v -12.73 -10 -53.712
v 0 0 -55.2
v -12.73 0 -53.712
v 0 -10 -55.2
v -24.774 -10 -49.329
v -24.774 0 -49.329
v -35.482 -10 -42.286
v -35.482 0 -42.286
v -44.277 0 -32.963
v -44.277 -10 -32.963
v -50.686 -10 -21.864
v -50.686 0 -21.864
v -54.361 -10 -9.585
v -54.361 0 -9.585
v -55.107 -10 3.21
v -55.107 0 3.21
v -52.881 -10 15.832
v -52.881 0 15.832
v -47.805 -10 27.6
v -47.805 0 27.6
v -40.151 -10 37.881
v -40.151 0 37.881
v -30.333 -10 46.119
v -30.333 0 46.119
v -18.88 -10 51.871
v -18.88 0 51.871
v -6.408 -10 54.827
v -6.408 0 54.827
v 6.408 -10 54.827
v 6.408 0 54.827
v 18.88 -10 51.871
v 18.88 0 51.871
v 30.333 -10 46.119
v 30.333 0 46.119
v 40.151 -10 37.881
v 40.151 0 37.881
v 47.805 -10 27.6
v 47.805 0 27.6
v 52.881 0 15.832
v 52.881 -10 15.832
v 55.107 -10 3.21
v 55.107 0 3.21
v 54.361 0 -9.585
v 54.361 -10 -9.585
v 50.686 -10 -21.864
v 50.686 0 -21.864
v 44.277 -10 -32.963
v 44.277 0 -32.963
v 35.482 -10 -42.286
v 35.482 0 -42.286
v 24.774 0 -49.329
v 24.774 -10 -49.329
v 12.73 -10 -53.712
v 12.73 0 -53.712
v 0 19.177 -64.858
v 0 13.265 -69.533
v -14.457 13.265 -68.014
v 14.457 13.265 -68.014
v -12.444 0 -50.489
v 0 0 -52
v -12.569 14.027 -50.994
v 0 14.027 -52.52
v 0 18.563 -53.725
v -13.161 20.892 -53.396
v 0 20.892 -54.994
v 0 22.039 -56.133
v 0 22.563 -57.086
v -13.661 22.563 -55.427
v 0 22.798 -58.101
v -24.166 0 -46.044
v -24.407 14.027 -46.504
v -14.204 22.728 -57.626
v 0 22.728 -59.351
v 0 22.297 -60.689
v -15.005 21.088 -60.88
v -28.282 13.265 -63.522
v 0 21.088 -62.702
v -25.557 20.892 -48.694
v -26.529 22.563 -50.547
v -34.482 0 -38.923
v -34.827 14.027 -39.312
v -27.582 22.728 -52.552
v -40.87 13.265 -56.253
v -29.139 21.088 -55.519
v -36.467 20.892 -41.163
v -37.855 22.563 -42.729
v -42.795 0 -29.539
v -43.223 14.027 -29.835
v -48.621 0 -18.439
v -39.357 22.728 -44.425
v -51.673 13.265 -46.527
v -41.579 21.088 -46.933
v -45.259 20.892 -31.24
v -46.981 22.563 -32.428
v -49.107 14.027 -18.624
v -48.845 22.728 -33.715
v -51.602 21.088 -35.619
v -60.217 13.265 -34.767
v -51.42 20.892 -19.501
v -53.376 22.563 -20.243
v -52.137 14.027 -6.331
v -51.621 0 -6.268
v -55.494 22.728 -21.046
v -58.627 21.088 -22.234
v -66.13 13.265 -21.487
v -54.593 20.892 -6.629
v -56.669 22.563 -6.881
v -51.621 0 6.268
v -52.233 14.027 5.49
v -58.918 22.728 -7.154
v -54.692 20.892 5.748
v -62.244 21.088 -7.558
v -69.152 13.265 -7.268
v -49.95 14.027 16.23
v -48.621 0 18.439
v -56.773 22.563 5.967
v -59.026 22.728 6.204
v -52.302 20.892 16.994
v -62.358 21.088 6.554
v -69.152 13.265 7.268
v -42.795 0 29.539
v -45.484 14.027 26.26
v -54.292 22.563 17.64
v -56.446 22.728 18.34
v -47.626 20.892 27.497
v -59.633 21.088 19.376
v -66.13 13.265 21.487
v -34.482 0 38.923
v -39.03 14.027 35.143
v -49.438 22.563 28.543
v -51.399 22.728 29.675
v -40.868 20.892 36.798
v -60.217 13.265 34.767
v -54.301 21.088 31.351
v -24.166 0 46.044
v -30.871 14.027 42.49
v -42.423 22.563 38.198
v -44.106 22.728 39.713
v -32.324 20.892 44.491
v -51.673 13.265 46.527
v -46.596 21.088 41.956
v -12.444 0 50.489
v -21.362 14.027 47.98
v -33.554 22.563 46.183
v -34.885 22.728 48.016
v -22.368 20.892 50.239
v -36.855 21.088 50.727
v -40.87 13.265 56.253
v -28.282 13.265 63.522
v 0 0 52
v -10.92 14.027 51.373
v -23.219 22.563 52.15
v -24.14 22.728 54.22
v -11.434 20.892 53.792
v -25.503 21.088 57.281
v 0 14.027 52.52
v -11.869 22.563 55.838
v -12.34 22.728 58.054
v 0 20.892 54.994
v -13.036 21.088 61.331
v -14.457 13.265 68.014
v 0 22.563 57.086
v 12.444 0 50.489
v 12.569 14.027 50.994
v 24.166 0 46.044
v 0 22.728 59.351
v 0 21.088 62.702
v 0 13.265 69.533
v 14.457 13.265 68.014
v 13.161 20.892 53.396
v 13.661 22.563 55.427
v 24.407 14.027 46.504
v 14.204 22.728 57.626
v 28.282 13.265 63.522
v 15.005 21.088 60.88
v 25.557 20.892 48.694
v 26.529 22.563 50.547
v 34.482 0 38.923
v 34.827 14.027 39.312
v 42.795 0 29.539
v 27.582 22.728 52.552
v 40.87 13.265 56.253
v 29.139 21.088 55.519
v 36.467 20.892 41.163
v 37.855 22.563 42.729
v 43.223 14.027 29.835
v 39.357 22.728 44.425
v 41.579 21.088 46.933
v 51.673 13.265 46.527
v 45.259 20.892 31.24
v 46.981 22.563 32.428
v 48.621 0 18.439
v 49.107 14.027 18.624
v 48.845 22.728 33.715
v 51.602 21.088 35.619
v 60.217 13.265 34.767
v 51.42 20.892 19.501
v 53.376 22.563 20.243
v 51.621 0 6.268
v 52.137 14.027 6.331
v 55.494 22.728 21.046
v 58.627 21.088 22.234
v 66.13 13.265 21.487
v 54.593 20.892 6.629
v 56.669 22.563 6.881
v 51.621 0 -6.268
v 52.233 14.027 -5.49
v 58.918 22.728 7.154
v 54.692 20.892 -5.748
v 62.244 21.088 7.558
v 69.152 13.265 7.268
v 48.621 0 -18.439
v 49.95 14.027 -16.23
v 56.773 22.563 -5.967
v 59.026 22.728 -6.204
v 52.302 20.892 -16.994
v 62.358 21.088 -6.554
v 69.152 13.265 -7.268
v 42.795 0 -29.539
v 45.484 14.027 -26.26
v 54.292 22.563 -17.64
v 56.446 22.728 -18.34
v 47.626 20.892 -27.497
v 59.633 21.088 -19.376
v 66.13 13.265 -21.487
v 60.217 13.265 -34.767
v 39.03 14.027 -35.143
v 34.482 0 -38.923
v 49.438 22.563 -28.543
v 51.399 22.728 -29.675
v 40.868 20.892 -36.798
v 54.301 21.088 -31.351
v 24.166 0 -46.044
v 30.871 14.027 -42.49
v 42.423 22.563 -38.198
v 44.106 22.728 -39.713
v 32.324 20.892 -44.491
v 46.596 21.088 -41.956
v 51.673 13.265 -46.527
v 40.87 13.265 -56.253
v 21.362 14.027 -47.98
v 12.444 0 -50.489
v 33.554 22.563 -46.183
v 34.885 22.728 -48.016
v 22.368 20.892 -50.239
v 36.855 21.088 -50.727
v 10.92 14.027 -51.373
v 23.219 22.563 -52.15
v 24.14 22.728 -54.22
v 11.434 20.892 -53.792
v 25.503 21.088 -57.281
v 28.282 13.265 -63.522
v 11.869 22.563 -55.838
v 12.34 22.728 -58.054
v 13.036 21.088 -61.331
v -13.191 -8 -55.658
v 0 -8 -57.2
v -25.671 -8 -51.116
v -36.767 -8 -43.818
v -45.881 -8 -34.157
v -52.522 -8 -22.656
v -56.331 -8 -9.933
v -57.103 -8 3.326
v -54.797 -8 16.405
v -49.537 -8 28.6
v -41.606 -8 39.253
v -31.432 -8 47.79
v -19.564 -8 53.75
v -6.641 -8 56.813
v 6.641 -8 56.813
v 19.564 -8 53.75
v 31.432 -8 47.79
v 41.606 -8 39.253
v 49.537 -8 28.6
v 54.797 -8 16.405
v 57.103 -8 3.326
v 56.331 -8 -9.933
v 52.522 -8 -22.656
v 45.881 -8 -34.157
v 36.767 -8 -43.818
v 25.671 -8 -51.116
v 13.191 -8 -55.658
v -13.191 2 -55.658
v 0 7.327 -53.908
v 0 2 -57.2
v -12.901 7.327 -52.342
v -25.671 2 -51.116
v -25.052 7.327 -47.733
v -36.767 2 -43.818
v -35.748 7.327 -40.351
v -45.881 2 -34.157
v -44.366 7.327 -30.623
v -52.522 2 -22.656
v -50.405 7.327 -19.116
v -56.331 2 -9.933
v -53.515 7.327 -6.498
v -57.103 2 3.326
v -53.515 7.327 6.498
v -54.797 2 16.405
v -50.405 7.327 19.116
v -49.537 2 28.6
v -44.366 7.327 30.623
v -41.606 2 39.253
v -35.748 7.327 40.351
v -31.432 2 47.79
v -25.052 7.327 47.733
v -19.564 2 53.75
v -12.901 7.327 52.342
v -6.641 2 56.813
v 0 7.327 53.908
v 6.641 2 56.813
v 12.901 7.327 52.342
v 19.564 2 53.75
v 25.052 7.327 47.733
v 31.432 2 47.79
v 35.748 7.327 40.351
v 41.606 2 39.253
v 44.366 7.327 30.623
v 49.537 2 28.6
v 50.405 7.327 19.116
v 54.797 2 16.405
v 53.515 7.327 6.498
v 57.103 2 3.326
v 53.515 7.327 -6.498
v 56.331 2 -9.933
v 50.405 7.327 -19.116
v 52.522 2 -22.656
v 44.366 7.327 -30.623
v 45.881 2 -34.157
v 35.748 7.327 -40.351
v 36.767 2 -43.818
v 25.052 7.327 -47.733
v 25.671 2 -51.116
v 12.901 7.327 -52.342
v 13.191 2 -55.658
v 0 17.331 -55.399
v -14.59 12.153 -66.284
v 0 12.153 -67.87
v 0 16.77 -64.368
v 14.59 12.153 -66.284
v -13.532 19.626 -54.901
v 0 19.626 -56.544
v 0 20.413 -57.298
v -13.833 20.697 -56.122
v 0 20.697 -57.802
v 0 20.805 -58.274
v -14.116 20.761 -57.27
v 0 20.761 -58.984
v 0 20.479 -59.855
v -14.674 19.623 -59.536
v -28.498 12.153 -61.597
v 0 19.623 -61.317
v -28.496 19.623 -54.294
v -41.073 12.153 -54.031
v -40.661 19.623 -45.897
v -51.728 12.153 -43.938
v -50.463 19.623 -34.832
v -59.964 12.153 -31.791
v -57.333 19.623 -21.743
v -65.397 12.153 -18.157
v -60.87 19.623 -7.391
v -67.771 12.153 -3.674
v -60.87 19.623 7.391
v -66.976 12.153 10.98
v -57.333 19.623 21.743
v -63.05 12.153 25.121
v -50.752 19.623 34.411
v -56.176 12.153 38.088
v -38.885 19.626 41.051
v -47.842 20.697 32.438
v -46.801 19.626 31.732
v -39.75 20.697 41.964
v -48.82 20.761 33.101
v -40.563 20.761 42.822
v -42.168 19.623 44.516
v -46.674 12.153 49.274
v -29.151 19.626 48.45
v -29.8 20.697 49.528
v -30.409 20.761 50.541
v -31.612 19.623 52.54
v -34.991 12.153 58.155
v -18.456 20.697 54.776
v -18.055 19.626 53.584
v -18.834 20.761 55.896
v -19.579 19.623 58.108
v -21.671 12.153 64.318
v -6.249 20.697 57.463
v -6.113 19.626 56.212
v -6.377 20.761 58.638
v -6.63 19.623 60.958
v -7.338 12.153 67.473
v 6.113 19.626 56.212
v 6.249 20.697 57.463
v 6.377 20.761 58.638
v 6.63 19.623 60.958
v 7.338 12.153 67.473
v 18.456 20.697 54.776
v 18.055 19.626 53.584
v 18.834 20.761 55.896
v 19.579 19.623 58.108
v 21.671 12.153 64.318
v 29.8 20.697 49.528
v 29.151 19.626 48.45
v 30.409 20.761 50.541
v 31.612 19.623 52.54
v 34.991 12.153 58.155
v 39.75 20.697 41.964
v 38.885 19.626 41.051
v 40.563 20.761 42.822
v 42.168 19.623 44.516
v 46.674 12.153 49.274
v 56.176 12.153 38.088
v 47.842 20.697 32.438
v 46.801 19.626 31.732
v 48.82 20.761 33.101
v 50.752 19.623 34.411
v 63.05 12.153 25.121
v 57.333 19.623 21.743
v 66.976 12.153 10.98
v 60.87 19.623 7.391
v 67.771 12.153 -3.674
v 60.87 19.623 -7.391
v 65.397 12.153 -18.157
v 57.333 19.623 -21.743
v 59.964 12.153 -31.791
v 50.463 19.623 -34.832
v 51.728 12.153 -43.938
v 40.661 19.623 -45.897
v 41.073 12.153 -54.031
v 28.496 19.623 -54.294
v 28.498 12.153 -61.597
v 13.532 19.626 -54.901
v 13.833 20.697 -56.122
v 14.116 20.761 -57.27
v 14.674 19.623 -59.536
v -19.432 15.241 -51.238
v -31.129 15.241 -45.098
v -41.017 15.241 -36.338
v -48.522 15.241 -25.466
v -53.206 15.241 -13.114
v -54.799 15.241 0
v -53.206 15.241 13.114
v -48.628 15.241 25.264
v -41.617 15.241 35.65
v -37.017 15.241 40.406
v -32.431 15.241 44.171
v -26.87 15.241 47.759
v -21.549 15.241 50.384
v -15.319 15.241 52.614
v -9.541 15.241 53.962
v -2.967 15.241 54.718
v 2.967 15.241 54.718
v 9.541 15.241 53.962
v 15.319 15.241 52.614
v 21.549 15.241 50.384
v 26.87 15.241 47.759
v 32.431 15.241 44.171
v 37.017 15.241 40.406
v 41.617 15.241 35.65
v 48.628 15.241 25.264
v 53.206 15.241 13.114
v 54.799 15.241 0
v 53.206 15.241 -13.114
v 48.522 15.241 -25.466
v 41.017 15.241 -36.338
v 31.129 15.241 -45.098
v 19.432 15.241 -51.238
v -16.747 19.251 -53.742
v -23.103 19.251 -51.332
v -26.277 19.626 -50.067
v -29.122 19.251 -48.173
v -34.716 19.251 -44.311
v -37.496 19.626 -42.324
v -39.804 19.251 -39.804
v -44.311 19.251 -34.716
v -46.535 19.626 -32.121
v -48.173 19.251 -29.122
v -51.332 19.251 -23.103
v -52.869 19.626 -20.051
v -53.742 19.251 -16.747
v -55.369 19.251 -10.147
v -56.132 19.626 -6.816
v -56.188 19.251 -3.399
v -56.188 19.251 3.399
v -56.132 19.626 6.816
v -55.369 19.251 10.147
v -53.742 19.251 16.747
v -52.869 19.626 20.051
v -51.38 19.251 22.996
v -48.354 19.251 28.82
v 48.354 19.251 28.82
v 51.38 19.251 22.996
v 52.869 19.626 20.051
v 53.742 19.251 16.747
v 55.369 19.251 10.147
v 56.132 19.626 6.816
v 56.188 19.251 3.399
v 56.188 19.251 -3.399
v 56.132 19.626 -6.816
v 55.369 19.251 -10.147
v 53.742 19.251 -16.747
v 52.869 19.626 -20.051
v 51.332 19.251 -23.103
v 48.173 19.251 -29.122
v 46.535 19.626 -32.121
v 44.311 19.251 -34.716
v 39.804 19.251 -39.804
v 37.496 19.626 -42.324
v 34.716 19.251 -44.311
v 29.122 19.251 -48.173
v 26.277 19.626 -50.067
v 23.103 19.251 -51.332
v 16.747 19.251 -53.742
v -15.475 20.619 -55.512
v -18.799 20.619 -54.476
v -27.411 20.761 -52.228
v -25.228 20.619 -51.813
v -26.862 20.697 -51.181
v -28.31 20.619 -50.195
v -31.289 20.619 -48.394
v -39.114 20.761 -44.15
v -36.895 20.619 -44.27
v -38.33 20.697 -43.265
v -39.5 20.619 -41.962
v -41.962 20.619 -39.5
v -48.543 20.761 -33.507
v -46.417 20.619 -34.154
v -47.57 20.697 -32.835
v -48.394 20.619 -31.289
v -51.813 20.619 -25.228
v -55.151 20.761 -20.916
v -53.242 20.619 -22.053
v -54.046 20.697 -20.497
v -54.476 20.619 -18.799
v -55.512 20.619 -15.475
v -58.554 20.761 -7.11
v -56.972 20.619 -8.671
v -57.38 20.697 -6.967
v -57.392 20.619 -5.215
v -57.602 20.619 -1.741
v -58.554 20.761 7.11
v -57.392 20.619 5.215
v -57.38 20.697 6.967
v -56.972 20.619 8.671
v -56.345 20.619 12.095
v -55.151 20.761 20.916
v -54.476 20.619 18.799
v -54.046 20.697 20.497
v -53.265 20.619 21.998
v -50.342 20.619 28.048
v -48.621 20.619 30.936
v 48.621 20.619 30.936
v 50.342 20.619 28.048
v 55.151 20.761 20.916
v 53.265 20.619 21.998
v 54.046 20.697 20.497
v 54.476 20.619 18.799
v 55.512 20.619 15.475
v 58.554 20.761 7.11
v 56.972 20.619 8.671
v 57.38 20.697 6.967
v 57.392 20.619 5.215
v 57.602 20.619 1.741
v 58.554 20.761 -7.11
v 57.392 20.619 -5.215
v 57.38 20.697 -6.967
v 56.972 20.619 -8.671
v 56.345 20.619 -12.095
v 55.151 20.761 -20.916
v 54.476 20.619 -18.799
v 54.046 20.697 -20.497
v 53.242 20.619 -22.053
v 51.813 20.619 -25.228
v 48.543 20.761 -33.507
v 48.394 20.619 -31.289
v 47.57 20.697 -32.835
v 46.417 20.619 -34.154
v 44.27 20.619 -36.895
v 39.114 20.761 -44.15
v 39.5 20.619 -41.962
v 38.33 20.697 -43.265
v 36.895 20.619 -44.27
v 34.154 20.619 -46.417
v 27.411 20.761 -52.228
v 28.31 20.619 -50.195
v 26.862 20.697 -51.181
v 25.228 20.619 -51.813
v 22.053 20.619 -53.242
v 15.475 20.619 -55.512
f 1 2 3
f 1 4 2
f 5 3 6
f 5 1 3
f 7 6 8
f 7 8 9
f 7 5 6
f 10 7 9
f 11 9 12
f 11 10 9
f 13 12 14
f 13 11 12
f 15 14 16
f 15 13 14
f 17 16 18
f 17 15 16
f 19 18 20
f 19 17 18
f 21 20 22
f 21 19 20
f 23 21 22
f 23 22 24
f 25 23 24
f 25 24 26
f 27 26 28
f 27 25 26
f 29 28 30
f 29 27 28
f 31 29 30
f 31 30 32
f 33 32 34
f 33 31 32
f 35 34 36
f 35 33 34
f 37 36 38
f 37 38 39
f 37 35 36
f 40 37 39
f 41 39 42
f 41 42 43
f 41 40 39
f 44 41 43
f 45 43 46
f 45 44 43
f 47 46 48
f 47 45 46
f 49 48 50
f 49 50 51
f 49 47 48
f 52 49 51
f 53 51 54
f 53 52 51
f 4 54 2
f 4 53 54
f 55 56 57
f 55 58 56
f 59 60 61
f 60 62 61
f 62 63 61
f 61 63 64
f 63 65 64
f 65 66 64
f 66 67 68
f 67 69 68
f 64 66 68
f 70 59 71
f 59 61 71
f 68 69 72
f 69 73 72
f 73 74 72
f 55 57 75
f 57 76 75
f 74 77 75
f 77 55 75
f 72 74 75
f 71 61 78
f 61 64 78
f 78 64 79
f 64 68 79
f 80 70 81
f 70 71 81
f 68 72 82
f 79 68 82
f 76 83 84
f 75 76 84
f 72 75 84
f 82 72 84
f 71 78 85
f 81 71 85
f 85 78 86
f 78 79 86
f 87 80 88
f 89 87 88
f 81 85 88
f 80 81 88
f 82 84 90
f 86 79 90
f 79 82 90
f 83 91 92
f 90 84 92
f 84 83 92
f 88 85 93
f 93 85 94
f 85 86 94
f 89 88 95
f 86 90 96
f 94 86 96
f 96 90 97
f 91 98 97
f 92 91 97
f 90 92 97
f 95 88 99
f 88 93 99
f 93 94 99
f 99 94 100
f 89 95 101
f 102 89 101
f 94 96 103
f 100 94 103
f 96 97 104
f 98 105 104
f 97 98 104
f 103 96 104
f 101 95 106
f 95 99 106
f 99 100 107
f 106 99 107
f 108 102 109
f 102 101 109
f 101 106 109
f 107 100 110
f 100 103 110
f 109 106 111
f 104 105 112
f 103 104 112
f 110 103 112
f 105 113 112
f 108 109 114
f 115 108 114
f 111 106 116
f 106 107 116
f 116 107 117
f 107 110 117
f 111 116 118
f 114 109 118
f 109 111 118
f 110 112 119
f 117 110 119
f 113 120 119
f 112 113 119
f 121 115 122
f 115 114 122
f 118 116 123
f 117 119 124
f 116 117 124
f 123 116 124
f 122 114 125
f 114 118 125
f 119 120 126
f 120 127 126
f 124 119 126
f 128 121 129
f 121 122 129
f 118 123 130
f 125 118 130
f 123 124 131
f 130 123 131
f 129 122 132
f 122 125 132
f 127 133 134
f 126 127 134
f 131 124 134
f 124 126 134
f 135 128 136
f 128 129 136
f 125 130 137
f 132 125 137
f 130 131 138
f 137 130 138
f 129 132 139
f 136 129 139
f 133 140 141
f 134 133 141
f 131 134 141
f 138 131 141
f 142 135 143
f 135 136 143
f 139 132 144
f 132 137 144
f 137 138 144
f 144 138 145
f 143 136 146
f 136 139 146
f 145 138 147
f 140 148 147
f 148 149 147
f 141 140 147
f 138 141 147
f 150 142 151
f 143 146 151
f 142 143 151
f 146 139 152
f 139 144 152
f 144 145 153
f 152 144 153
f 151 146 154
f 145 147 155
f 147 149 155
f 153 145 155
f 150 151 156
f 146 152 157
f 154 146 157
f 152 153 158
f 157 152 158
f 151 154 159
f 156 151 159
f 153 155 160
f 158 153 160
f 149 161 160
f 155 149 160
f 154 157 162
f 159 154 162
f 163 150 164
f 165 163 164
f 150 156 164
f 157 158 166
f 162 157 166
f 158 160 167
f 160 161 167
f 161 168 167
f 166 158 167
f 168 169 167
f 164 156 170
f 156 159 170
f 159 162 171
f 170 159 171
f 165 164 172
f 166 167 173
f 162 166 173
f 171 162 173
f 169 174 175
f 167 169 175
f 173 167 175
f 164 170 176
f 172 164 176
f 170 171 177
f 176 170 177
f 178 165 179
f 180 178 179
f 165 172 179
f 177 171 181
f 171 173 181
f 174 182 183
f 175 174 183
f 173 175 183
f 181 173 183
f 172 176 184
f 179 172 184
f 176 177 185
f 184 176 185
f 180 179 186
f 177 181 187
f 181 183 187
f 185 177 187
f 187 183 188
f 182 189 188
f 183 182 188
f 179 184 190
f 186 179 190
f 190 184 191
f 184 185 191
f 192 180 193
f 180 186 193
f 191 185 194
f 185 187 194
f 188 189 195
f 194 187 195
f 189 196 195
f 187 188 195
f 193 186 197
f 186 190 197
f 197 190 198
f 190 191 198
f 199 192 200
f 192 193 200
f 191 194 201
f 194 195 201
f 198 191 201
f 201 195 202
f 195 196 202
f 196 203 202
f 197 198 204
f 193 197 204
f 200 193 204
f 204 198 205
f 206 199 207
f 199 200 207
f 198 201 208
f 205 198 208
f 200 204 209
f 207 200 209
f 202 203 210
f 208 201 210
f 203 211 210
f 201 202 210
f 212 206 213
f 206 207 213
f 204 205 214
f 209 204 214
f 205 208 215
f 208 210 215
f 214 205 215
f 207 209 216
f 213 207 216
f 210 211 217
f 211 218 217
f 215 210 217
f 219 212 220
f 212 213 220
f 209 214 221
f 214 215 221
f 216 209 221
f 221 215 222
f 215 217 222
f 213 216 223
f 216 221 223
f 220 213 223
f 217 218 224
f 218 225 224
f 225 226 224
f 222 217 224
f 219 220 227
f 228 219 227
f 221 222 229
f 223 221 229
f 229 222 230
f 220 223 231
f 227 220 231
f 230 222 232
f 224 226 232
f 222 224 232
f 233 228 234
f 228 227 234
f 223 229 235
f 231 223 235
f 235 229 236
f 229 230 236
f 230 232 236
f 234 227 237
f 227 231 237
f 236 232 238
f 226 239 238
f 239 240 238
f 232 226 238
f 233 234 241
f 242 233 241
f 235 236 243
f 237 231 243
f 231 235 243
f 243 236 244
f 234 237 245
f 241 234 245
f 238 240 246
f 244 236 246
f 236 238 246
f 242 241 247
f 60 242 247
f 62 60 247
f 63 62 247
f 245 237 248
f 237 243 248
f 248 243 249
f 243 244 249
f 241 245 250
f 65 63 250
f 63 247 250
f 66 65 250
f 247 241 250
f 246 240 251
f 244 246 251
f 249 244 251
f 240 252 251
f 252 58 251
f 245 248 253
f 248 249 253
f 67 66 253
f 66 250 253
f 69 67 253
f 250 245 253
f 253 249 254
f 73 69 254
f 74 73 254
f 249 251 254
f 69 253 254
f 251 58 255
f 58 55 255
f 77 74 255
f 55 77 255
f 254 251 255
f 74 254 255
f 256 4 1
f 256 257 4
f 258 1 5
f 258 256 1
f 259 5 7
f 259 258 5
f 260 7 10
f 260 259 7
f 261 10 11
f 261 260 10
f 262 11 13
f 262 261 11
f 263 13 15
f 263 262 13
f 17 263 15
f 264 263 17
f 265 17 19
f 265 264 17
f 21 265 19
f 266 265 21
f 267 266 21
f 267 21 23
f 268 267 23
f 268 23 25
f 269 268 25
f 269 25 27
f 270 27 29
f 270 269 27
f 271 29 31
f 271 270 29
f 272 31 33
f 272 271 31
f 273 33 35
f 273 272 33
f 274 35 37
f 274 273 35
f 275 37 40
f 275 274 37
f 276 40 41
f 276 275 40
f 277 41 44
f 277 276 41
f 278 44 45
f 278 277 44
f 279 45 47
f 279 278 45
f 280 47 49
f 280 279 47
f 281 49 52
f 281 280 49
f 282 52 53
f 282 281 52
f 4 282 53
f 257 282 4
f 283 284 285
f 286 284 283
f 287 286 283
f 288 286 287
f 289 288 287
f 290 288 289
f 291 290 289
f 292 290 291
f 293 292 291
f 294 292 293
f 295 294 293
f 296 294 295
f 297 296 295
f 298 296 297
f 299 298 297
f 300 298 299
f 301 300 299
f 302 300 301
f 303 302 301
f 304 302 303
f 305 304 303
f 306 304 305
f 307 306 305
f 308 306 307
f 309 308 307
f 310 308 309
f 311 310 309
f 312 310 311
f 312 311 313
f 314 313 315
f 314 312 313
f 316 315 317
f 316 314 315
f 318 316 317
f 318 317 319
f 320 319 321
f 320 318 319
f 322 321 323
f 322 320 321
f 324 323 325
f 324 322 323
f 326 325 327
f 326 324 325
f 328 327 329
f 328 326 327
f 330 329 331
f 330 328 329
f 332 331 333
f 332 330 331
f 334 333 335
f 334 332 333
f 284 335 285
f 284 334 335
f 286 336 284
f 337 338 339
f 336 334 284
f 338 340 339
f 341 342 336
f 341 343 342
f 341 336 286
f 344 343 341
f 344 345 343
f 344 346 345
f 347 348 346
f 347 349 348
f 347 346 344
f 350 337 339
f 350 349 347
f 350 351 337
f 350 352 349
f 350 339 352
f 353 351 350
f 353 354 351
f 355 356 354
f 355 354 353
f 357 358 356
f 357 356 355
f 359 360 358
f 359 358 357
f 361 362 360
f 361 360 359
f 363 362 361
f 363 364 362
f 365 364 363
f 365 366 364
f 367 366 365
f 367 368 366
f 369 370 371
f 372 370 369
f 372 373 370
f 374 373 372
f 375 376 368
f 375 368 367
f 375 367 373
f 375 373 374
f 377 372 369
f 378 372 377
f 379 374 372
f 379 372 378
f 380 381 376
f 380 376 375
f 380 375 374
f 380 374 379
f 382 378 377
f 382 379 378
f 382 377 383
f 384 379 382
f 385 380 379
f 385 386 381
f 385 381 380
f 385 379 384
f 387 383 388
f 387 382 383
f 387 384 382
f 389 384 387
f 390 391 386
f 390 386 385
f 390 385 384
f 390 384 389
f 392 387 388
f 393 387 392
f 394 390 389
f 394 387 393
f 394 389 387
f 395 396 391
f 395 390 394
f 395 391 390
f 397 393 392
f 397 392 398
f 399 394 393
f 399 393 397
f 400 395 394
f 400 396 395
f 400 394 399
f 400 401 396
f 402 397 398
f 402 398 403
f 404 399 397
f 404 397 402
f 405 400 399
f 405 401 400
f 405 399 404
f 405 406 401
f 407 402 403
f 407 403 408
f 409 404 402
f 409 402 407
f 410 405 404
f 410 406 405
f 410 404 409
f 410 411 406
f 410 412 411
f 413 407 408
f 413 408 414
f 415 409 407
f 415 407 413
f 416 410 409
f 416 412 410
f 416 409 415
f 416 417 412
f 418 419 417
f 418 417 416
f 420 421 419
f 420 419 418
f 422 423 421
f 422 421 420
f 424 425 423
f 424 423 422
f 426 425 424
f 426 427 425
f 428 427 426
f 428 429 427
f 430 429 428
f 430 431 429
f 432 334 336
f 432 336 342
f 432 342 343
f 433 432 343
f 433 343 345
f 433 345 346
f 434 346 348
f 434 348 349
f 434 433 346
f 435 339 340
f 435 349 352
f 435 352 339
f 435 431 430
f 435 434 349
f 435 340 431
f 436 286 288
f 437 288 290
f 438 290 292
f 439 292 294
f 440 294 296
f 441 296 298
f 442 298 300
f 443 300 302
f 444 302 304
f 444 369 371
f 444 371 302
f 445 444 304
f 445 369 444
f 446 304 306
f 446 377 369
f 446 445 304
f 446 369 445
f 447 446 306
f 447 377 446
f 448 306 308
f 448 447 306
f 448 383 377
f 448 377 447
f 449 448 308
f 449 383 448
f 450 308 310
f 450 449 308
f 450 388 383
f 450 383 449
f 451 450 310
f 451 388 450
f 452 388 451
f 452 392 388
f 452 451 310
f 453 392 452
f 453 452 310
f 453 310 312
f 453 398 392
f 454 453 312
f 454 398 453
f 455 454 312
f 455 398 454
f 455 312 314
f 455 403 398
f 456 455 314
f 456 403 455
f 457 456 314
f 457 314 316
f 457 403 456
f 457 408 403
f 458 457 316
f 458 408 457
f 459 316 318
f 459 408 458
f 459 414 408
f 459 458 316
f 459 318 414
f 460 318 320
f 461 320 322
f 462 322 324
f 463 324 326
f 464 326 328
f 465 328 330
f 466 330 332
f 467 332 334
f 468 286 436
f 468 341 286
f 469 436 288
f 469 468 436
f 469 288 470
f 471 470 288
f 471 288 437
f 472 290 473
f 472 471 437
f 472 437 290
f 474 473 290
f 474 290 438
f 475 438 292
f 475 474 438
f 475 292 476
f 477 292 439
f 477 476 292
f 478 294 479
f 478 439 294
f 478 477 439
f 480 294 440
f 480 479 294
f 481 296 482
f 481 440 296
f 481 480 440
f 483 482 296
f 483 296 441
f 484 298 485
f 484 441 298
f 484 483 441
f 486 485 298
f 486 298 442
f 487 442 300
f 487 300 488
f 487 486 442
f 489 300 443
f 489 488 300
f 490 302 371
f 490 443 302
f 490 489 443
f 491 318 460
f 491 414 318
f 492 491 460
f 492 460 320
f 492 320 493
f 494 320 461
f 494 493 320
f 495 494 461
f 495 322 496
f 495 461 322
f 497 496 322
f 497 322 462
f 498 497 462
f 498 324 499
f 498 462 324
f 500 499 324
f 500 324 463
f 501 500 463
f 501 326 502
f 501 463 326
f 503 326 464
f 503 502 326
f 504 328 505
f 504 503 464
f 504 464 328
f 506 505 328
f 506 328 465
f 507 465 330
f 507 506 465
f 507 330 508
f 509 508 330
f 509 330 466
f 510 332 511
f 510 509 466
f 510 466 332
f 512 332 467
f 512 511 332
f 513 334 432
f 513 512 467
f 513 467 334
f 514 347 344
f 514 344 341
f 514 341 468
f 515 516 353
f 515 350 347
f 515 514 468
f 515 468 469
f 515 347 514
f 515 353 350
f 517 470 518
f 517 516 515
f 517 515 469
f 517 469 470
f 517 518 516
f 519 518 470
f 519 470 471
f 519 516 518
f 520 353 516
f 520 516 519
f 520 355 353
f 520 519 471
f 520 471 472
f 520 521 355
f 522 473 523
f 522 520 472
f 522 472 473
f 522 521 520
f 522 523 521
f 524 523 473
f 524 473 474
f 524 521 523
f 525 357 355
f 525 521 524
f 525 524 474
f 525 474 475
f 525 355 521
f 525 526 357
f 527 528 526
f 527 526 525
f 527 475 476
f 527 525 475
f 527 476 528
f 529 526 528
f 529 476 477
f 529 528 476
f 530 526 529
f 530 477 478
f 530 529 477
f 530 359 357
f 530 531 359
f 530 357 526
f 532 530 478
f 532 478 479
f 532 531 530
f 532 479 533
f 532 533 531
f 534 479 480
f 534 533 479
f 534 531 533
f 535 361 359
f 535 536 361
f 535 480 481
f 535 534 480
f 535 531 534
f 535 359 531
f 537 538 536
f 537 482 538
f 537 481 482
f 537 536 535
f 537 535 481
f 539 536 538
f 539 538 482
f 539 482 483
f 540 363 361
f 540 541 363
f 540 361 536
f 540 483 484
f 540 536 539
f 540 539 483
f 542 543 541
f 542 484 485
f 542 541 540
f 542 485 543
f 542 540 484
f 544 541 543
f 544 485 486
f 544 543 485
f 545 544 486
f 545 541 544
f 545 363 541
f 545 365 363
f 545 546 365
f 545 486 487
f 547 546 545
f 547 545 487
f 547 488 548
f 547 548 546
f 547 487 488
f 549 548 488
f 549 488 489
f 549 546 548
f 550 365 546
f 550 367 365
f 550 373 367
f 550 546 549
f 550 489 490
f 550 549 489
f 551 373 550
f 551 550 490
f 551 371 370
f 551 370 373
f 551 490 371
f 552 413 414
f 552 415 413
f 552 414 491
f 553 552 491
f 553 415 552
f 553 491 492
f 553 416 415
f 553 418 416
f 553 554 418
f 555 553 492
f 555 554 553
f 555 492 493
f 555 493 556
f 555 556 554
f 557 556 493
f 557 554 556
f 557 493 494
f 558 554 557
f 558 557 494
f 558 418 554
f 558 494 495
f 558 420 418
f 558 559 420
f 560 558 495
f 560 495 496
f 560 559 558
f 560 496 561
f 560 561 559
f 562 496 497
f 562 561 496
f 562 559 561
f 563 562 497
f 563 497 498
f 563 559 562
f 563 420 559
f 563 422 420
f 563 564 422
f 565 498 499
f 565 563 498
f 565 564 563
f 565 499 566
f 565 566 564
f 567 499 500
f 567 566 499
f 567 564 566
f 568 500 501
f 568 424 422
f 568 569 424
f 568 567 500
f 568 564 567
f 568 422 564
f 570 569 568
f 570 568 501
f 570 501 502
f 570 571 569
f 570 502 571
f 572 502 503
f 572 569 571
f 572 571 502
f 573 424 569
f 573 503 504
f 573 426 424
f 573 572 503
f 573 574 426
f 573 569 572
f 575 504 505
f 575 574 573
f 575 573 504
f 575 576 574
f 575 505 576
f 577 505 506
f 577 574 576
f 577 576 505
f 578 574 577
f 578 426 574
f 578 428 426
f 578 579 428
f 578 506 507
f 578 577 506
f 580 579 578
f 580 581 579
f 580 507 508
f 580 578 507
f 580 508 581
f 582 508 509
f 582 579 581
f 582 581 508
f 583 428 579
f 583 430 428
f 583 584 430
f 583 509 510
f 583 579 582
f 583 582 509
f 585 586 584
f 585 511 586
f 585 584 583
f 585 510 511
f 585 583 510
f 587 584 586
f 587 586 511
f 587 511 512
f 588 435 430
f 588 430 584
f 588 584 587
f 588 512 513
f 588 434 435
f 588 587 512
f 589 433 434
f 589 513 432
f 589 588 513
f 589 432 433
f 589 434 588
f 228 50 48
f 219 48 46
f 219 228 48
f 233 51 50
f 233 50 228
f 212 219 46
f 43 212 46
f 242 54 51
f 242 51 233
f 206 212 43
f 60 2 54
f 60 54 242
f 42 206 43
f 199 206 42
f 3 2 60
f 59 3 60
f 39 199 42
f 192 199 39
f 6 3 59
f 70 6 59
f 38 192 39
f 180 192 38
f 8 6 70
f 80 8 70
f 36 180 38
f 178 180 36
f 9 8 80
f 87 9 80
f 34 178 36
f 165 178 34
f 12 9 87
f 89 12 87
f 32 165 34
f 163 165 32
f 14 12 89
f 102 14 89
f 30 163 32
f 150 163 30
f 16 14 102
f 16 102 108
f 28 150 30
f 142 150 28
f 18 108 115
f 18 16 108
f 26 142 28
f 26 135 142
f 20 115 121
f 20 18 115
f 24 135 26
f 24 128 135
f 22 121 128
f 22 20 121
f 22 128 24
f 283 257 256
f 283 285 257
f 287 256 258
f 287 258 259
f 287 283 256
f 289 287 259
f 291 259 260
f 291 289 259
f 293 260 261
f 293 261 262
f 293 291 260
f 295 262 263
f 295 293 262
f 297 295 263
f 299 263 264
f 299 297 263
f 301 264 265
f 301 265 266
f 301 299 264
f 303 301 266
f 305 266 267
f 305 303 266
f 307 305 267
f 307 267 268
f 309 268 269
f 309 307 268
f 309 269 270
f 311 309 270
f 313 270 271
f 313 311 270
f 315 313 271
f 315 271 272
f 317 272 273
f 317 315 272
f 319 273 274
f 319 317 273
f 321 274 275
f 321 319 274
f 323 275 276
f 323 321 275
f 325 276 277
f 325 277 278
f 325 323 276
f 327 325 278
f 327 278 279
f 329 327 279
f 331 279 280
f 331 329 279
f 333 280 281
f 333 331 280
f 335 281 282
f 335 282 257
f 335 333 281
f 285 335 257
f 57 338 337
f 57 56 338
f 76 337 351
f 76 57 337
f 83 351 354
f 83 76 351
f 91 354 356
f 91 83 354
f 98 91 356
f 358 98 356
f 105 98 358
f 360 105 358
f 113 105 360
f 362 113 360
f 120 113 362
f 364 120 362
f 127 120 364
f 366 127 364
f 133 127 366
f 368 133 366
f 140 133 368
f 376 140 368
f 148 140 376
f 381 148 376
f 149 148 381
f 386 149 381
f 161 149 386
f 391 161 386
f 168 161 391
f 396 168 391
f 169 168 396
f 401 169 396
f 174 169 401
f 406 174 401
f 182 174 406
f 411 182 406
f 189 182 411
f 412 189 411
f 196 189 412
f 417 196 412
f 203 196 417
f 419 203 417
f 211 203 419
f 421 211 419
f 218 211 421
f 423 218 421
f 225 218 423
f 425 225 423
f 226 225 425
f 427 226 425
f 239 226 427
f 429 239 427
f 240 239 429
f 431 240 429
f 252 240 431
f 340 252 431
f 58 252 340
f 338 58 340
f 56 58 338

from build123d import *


with BuildPart() as part:
    # Sketch2 → Revolve1 (revolve)
    with BuildSketch(Plane.XY, mode=Mode.PRIVATE) as revolve1_sk:
        with BuildLine():
            add(Edge.make_bspline(
                [(-53.908291981, 7.327266282), (-53.915048613, 7.539366649), (-53.94495988, 8.357050919), (-54.053665037, 10.294944264), (-54.326389869, 12.882424144), (-54.972726359, 16.34709685), (-55.898693692, 18.77001029), (-56.883362954, 20.105486165), (-57.543446966, 20.616490503), (-58.112880499, 20.817571586), (-58.814977092, 20.833320308), (-59.822438492, 20.544156721), (-61.106275976, 19.825684528), (-62.596941056, 18.635703923), (-64.239568543, 16.971141372), (-65.711130001, 15.184476573), (-66.925551876, 13.537321116), (-67.564645811, 12.610199482), (-67.87038563, 12.152912125)],
                knots=[0.106853713, 0.106853713, 0.106853713, 0.106853713, 0.117351765, 0.147787911, 0.208660203, 0.269532495, 0.391277079, 0.452149371, 0.513021663, 0.573893955, 0.634766248, 0.69563854, 0.756510832, 0.817383124, 0.878255416, 0.939127708, 0.969563854, 1, 1, 1, 1], degree=3))
            Line((-67.87038563, 12.152912125), (-69.533005379, 13.264530571))
            add(Edge.make_bspline(
                [(-52, 0), (-50.74543551, 25.338717699), (-58.822132089, 29.284514334), (-69.533005379, 13.264530571)],
                knots=[0, 0, 0, 0, 1, 1, 1, 1], degree=3))
            Line((-52, 0), (-55.2, 0))
            Line((-55.2, 0), (-55.2, -10))
            Line((-55.2, -10), (-57.2, -8))
            Line((-57.2, -8), (-57.2, 0))
            Line((-57.2, 0), (-57.2, 2))
            Line((-57.2, 2), (-53.908291981, 7.327266282))
        make_face()
    revolve(revolve1_sk.sketch.rotate(Axis((0, 0, 0), (0, 1, 0)), 270), axis=Axis((0, 0, 0), (0, 1, 0)))


solid = part.part
